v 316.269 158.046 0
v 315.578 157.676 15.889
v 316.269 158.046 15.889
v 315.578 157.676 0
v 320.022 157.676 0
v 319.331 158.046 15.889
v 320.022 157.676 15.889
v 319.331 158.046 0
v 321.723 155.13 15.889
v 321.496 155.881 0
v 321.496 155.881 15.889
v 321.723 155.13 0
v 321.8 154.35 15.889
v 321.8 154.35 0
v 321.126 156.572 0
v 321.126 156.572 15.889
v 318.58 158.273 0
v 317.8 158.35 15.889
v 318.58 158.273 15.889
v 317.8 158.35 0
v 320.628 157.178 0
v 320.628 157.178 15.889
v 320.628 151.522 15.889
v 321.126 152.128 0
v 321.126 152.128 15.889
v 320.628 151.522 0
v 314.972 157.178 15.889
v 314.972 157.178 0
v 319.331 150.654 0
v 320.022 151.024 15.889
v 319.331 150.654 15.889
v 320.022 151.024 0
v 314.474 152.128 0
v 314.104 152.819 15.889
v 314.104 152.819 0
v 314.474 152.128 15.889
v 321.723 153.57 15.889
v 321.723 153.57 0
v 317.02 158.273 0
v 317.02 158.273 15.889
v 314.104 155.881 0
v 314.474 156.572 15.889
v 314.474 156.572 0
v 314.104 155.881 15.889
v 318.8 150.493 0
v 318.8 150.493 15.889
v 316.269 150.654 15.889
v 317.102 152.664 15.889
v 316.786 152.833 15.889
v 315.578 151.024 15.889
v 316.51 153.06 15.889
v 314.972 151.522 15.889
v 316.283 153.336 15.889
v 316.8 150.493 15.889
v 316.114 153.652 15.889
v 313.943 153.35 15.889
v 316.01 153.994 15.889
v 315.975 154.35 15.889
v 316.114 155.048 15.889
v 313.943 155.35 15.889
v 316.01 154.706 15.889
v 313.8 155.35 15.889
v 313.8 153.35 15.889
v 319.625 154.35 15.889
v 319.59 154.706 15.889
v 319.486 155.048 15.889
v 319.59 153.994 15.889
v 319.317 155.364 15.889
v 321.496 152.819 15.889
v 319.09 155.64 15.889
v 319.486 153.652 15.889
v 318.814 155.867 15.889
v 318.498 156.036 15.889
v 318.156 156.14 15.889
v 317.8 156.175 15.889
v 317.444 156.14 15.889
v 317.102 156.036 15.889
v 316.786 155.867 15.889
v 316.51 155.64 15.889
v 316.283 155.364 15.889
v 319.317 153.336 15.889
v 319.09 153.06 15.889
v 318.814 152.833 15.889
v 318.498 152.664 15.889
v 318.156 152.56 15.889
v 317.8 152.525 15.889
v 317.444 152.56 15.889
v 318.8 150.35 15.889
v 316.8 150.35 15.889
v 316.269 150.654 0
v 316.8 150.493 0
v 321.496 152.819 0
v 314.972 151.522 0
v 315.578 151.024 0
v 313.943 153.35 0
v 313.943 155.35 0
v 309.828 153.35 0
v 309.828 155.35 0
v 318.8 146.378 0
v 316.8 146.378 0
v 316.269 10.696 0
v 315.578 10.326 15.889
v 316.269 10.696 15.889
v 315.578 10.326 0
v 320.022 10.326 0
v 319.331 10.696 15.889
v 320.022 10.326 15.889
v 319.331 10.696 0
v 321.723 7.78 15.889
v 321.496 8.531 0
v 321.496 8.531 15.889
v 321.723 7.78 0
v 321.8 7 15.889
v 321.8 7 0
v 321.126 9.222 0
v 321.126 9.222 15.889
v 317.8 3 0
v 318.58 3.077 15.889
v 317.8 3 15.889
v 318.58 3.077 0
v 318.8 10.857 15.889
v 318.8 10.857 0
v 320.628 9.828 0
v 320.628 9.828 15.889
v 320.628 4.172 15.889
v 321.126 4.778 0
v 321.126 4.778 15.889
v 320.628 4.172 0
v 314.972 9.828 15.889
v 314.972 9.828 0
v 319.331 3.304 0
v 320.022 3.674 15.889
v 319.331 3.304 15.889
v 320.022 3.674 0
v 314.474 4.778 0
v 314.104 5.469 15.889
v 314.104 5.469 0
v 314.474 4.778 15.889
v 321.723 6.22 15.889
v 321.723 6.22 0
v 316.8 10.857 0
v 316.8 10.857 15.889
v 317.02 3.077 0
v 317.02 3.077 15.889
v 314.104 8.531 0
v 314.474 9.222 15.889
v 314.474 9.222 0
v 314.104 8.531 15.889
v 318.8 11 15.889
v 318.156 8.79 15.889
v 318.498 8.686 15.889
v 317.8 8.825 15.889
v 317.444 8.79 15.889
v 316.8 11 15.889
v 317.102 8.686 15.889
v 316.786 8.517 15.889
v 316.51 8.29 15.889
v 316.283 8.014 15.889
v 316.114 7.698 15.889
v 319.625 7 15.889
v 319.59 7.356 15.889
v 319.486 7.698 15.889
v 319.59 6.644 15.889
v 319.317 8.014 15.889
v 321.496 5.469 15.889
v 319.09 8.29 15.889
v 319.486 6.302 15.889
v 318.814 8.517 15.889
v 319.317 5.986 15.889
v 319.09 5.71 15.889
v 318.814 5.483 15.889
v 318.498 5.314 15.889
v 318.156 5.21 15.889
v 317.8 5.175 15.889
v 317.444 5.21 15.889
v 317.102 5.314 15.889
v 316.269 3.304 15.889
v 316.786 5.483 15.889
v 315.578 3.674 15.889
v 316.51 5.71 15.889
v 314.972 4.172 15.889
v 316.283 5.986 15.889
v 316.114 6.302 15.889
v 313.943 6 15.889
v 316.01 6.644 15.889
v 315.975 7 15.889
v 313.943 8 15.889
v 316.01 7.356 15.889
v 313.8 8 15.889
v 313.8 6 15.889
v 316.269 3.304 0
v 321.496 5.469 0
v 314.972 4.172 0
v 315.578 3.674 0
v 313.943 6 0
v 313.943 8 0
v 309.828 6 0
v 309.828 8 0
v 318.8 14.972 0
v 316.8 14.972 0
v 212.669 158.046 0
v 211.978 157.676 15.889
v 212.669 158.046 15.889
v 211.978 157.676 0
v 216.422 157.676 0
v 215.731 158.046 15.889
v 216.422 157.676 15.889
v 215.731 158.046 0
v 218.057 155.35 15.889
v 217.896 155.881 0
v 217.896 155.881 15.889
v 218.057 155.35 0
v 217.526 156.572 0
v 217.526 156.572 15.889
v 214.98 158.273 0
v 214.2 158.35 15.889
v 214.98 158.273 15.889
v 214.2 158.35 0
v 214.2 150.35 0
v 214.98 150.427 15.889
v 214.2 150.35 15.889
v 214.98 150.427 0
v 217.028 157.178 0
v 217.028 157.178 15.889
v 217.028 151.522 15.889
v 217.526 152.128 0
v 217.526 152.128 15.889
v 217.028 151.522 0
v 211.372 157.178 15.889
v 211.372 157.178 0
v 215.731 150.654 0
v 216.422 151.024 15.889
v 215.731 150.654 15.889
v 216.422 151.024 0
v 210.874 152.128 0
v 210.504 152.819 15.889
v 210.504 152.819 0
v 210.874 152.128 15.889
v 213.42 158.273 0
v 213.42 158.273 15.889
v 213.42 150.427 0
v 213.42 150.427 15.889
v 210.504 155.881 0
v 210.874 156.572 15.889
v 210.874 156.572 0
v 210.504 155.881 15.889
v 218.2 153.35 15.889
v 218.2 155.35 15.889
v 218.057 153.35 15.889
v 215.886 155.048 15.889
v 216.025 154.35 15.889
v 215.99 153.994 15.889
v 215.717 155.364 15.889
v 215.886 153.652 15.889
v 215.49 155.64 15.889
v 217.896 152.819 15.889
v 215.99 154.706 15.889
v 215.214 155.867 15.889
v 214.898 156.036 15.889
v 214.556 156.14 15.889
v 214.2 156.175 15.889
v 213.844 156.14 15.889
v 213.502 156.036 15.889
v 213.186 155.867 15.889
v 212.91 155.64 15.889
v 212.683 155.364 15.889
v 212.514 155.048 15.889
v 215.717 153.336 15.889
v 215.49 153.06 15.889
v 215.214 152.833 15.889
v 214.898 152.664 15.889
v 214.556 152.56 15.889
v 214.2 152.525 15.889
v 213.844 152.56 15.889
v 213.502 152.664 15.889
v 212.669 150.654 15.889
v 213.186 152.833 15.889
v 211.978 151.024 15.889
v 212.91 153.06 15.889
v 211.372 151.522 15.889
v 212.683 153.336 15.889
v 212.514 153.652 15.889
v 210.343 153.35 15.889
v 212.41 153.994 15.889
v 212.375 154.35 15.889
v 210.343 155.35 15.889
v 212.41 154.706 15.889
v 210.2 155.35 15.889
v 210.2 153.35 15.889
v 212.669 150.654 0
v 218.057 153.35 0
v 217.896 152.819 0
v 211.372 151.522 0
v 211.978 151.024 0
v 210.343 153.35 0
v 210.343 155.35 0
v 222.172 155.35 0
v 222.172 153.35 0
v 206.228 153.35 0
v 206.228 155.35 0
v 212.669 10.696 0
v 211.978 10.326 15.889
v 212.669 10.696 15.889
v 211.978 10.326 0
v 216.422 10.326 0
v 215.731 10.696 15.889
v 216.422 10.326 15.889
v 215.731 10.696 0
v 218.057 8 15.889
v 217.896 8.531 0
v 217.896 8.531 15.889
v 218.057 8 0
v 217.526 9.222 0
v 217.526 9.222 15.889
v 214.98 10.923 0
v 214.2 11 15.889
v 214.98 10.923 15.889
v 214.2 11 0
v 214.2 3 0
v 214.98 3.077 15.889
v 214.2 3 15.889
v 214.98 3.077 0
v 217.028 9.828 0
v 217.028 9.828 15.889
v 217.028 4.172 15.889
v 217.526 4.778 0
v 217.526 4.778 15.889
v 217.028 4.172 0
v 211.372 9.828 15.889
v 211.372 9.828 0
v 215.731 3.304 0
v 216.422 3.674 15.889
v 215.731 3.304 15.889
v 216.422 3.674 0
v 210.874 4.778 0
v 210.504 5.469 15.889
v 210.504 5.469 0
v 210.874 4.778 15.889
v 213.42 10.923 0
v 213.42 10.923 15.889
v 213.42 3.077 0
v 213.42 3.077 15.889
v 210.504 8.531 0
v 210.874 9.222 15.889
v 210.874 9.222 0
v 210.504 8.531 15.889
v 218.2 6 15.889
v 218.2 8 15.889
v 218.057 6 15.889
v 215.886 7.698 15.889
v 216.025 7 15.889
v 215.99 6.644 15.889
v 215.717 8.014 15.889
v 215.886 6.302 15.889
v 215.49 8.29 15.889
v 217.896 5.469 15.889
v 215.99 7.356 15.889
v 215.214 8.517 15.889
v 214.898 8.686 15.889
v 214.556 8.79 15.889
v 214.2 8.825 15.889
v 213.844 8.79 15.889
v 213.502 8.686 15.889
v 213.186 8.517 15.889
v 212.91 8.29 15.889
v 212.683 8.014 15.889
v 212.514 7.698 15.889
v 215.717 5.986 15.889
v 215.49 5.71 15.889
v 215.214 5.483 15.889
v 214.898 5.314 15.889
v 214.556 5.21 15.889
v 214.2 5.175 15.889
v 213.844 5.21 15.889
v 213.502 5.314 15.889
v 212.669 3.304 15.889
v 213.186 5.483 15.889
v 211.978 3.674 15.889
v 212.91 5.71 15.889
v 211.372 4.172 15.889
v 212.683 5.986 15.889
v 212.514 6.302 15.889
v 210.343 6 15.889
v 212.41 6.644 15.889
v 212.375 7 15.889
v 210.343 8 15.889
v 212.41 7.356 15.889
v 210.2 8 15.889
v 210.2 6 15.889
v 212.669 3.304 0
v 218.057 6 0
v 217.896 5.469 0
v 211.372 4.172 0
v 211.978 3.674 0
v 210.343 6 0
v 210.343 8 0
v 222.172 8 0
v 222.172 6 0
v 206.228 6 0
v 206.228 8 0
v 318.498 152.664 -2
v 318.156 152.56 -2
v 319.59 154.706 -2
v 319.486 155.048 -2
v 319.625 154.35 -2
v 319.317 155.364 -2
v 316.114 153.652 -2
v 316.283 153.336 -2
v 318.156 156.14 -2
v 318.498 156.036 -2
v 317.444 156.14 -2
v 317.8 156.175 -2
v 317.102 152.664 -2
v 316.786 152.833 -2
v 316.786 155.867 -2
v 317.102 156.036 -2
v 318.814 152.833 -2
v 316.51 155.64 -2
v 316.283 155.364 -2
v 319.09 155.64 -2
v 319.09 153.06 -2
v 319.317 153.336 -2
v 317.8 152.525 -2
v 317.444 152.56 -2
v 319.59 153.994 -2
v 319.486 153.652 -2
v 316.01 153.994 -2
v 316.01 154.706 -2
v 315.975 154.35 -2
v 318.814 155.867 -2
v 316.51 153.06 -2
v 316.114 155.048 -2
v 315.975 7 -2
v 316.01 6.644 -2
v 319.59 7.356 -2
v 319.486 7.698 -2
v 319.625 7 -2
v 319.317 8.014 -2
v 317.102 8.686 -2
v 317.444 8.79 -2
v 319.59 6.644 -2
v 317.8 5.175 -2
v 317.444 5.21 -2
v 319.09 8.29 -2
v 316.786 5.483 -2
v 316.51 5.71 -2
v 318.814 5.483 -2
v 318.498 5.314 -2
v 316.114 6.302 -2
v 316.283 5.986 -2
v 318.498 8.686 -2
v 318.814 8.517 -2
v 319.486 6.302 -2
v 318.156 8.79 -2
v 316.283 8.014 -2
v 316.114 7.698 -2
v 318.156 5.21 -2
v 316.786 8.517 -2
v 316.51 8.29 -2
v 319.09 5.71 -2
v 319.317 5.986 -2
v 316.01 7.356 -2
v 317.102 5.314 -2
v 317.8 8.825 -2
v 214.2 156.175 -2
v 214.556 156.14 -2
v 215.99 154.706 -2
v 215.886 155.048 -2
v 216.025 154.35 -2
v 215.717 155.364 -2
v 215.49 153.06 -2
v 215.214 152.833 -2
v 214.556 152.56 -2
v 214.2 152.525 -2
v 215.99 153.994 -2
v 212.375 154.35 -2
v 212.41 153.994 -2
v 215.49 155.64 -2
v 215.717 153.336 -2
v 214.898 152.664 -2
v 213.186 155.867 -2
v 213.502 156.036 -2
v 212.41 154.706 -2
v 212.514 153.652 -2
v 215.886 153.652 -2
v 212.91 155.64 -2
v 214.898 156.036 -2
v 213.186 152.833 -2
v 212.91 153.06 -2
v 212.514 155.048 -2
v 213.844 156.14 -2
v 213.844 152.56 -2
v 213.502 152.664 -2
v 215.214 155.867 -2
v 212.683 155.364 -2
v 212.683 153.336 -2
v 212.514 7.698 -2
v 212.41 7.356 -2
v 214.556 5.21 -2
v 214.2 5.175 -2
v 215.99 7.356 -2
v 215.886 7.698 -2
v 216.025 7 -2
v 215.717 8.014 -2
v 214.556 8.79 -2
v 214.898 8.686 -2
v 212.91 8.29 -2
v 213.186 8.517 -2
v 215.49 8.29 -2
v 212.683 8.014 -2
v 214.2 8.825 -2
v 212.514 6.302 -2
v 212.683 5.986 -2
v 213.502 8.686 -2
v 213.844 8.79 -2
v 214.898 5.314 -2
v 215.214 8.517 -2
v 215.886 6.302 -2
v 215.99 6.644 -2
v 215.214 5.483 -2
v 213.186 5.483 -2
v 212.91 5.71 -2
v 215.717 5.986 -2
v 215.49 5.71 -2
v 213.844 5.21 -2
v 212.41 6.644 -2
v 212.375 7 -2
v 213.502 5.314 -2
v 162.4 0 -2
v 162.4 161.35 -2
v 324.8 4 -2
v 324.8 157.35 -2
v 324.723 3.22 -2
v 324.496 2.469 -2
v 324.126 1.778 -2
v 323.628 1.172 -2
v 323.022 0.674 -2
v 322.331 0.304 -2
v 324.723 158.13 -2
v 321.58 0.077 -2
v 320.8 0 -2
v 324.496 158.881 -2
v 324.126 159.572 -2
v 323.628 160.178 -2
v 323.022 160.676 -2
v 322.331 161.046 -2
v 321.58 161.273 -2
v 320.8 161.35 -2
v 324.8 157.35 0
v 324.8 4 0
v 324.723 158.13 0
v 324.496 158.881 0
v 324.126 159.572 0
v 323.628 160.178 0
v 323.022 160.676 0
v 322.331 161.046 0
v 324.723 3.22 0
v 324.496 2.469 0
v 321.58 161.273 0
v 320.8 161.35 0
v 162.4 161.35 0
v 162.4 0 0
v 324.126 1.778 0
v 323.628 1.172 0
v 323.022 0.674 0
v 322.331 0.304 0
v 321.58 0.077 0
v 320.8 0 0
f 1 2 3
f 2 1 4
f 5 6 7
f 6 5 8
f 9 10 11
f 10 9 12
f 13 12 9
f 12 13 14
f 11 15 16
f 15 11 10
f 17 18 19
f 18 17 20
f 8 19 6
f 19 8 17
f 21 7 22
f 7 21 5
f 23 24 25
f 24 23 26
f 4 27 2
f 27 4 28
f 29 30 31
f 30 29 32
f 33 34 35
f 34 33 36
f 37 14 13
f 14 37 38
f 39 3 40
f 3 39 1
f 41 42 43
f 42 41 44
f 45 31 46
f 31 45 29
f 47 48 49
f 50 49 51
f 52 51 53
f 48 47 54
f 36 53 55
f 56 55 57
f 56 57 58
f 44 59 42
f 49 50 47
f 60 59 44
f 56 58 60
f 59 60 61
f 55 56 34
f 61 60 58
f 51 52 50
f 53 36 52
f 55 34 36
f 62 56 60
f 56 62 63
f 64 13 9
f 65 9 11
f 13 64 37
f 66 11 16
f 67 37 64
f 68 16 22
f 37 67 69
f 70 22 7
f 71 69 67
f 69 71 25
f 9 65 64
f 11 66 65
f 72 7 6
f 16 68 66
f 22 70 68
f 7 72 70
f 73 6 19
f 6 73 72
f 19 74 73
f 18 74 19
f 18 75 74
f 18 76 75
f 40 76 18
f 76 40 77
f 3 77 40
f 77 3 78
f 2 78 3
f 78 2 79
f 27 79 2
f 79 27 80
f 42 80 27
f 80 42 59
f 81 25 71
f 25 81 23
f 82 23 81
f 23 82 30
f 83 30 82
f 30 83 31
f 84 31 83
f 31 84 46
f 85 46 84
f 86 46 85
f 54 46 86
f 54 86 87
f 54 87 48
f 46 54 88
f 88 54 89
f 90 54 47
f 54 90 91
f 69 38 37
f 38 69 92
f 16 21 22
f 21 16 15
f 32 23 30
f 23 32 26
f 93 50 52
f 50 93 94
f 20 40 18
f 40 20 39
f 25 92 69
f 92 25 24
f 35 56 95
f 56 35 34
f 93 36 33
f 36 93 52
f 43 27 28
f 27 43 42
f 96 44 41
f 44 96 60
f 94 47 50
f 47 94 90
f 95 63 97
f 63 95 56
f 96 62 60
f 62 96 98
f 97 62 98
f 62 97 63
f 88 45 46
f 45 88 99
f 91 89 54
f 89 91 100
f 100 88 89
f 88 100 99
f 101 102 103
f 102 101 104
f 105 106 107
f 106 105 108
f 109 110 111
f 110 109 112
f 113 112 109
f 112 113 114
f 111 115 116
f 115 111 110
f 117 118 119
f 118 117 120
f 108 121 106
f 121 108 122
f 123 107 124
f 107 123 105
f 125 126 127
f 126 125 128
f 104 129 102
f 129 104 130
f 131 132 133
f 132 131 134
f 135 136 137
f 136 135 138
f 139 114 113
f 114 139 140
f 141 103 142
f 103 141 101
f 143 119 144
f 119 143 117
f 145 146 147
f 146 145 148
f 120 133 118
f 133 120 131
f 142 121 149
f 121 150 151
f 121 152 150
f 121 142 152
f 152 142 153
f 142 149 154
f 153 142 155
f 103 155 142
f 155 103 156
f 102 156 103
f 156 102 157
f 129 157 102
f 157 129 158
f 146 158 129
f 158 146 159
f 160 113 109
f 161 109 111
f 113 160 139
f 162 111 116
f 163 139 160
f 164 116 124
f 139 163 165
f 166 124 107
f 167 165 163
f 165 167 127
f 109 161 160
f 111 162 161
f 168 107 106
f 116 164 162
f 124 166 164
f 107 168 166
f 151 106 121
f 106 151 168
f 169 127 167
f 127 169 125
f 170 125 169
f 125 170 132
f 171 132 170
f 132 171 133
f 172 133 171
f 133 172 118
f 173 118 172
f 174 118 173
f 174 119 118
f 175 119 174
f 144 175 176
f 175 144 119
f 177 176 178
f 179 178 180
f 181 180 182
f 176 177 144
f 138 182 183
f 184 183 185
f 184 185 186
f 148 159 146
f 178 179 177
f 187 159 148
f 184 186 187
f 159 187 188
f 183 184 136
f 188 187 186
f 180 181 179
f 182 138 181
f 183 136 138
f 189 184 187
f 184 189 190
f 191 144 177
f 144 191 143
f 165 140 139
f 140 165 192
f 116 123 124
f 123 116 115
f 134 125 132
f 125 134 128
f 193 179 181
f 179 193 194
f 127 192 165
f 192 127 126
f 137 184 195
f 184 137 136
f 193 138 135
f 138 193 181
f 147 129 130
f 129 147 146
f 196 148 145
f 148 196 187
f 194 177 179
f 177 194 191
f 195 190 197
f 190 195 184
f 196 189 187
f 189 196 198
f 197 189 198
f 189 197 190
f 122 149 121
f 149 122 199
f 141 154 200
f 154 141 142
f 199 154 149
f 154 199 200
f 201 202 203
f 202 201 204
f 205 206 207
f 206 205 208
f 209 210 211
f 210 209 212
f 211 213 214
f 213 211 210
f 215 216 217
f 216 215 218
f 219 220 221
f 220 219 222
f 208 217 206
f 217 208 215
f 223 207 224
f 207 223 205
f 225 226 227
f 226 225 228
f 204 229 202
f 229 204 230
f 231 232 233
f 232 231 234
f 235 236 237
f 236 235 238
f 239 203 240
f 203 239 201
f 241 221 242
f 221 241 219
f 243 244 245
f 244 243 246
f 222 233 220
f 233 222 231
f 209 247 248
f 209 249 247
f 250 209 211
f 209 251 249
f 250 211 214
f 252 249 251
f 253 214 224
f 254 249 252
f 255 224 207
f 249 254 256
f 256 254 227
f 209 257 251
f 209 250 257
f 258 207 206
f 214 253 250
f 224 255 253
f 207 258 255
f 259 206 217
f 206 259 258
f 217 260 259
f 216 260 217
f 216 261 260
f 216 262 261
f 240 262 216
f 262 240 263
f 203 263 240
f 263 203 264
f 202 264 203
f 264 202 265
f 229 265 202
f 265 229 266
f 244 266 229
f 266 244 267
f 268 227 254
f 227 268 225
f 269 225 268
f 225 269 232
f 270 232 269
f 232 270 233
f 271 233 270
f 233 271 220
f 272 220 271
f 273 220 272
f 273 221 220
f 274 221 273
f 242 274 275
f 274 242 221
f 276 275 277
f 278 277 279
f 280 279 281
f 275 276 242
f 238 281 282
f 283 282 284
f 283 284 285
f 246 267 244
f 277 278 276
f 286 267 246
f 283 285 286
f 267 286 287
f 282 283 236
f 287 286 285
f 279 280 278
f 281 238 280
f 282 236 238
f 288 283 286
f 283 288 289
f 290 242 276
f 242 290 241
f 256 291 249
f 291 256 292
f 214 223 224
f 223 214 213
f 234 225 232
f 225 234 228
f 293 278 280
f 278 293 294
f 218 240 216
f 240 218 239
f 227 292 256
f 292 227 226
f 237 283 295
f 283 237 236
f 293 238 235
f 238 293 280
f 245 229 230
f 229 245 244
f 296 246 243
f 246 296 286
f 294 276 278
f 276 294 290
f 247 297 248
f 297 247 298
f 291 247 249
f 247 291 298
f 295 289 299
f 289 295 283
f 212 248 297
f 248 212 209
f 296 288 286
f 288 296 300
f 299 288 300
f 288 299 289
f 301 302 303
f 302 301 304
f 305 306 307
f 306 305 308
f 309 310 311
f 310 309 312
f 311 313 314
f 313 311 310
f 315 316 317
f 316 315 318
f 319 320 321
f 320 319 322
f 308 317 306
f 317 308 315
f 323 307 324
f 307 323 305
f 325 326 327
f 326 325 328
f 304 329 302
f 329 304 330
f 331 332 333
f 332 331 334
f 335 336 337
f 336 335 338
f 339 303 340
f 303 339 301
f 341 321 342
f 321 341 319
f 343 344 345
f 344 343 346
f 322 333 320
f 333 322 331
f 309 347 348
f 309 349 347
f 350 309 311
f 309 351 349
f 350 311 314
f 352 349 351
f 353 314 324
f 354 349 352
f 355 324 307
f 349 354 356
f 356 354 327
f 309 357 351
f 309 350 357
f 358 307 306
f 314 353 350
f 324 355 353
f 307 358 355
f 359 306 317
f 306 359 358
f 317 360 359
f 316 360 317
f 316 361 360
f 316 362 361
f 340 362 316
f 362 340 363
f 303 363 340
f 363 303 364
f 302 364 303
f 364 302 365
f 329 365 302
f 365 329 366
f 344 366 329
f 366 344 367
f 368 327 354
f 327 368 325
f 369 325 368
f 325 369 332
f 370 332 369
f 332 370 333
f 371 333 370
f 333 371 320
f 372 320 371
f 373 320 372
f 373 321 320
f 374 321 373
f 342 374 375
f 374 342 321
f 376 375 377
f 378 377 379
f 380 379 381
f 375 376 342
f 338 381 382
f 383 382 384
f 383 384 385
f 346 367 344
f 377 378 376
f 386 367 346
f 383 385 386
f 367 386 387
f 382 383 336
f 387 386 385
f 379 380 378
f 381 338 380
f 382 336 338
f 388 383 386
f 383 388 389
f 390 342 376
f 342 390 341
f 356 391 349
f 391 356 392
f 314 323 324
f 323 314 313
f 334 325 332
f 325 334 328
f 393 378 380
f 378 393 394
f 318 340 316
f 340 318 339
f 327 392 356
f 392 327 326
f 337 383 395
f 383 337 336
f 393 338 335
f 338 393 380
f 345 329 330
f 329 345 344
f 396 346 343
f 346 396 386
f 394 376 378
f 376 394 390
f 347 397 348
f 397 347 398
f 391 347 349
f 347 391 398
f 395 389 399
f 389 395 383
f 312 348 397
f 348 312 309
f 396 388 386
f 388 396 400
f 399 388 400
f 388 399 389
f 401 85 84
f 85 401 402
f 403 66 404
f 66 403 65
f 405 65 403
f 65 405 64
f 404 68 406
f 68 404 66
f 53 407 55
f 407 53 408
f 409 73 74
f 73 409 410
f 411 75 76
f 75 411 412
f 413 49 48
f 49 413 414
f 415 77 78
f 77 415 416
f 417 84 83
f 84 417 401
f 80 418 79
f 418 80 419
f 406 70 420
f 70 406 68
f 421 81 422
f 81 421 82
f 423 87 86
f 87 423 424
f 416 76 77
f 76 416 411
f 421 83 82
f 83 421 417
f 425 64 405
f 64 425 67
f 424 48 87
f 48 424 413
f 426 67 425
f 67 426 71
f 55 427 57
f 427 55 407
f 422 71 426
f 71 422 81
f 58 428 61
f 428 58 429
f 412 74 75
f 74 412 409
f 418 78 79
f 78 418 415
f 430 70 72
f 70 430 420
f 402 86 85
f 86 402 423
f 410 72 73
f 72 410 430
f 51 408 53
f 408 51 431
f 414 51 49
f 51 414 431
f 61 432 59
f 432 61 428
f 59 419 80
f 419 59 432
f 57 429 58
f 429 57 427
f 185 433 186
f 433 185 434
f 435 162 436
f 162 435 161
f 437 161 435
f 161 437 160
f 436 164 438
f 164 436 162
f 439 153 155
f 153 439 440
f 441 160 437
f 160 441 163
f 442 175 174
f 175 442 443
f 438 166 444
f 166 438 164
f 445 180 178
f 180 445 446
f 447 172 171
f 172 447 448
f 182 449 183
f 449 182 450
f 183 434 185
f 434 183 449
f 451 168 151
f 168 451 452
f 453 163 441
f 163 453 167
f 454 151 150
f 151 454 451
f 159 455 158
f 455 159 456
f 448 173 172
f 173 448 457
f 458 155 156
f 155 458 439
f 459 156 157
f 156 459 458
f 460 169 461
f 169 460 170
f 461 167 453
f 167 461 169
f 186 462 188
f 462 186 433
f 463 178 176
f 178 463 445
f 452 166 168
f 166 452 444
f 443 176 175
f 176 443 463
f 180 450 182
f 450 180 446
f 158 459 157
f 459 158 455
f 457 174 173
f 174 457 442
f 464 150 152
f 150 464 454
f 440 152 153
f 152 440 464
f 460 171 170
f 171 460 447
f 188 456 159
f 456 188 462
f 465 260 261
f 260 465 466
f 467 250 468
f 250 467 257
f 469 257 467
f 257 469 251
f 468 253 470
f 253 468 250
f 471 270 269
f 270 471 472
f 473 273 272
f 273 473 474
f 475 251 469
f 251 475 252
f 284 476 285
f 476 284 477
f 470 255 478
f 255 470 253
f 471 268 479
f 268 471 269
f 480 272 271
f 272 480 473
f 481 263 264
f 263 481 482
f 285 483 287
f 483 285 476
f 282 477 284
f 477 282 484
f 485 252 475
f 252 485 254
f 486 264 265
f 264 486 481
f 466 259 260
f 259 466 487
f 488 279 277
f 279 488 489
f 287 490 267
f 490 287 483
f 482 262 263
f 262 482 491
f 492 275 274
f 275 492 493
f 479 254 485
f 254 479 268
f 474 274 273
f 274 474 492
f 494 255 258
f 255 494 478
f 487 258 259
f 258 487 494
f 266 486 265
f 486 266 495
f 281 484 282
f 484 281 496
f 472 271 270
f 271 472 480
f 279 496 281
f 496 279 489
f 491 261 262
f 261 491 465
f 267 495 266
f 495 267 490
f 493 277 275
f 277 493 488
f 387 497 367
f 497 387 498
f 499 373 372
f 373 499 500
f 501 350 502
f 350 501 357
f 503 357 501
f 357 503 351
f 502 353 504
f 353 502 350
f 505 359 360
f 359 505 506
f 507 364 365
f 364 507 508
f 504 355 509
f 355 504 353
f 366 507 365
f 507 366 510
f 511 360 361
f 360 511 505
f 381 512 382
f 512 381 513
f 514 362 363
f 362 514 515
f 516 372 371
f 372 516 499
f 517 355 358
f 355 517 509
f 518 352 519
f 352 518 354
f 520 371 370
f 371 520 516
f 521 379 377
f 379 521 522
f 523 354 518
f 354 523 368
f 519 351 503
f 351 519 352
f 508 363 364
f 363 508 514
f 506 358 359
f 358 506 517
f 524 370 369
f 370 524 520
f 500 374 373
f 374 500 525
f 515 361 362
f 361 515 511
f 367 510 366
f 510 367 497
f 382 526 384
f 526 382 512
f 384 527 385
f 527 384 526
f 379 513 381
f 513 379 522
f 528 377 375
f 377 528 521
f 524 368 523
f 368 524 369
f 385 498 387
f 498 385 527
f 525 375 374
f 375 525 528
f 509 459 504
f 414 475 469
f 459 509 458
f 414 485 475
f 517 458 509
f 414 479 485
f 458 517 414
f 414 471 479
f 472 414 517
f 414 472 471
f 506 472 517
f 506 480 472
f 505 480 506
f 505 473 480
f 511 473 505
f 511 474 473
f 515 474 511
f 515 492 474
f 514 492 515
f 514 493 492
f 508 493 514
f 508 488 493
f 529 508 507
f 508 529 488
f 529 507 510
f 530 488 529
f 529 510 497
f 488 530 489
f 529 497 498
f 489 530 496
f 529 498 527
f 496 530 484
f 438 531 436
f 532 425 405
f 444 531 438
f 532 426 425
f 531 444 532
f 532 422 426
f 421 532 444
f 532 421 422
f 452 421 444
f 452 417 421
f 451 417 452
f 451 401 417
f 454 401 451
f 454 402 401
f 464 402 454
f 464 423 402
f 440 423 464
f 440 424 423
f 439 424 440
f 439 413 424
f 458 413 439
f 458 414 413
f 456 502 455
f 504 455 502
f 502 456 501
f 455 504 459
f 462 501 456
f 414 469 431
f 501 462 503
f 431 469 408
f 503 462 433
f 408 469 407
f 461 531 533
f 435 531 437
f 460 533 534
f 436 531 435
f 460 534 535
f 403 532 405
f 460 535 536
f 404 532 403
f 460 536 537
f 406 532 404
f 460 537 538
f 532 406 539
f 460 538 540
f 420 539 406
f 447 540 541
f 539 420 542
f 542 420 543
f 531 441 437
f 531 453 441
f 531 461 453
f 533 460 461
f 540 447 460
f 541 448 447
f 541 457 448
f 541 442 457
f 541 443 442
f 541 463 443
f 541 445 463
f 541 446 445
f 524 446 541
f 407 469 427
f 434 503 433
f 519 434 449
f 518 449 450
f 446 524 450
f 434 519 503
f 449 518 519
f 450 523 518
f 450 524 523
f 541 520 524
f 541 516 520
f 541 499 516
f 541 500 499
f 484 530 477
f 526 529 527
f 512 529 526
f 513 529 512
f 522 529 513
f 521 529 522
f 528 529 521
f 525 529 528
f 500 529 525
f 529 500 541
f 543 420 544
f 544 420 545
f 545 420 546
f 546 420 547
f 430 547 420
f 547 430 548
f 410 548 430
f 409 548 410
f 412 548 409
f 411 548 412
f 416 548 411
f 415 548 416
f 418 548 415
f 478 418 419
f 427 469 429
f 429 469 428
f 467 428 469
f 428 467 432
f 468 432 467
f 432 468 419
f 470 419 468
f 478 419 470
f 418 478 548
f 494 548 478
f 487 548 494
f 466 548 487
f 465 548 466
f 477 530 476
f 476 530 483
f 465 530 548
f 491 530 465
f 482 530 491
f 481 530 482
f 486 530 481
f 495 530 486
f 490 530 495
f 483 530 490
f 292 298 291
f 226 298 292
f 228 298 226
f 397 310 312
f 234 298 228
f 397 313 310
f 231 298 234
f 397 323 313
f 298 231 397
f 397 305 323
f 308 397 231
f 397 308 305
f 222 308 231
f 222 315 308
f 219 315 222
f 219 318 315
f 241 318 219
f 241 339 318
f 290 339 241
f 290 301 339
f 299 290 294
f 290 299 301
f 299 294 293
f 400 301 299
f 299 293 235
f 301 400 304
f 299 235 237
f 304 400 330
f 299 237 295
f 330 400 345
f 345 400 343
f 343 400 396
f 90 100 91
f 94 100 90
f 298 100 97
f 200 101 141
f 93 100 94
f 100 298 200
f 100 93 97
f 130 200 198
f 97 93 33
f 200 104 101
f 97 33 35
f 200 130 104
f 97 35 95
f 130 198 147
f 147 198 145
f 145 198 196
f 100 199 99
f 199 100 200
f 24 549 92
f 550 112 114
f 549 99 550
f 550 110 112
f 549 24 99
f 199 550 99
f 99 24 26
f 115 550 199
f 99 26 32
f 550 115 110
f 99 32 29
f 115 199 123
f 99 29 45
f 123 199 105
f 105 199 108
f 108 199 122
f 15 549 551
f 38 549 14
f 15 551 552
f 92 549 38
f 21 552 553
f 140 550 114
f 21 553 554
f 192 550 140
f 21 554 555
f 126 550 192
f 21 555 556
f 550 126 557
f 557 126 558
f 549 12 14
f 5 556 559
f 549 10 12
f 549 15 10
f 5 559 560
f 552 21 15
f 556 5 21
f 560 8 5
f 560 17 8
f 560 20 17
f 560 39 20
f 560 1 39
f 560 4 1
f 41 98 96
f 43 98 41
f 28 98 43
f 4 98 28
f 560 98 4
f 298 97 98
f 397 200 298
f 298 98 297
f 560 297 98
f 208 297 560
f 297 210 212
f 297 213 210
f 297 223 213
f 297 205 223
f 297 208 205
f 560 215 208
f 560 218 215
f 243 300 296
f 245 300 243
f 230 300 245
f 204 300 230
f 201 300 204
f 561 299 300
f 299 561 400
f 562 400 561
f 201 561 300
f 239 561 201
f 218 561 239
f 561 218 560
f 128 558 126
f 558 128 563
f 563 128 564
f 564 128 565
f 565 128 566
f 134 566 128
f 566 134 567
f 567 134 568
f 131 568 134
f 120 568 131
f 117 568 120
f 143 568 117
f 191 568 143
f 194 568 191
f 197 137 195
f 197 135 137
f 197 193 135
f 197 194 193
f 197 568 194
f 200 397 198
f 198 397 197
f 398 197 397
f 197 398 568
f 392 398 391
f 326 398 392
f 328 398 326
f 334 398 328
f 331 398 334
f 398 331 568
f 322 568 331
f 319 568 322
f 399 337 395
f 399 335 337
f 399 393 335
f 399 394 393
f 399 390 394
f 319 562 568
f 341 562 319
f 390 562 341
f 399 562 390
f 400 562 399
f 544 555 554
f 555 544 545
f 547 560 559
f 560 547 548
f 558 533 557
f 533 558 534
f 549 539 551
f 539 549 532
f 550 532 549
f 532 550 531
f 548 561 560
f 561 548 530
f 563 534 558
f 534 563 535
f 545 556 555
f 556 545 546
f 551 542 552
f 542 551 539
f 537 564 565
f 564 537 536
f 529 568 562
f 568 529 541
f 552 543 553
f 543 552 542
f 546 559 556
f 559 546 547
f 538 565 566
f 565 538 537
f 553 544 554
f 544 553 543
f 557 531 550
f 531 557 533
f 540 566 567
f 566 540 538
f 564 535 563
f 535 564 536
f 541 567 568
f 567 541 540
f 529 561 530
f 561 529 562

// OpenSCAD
// Generated by SolidPython 1.1.3 on 2024-04-18 16:18:07
$fn = 32;


difference() {
	intersection() {
		union() {
			difference() {
				translate(v = [0, 0, 16.4445000000]) {
					translate(v = [0, 147.3500000000, 0]) {
						translate(v = [10, 0, 0]) {
							difference() {
								translate(v = [-3, 0, 0]) {
									translate(v = [0, -140.3500000000, 0]) {
										translate(v = [0, 0, -69.5555000000]) {
											union() {
												translate(v = [0, 0, 0]) {
													translate(v = [0, 0, 0]) {
														union() {
															cylinder(h = 69, r = 4.0000000000);
															rotate(a = 90, v = [1, 0, 0]) {
																linear_extrude(center = true, height = 2) {
																	polygon(paths = [[0, 1, 2, 3]], points = [[0, 0], [0, 69], [4.0000000000, 69], [21.2500000000, 0]]);
																}
															}
															rotate(a = 90, v = [0, 0, 1]) {
																rotate(a = 90, v = [1, 0, 0]) {
																	linear_extrude(center = true, height = 2) {
																		polygon(paths = [[0, 1, 2, 3]], points = [[0, 0], [0, 69], [4.0000000000, 69], [21.2500000000, 0]]);
																	}
																}
															}
														}
													}
												}
												translate(v = [0, 0, 0]) {
													translate(v = [0, 147.3500000000, 0]) {
														union() {
															cylinder(h = 69, r = 4.0000000000);
															rotate(a = 90, v = [1, 0, 0]) {
																linear_extrude(center = true, height = 2) {
																	polygon(paths = [[0, 1, 2, 3]], points = [[0, 0], [0, 69], [4.0000000000, 69], [21.2500000000, 0]]);
																}
															}
															rotate(a = 270, v = [0, 0, 1]) {
																rotate(a = 90, v = [1, 0, 0]) {
																	linear_extrude(center = true, height = 2) {
																		polygon(paths = [[0, 1, 2, 3]], points = [[0, 0], [0, 69], [4.0000000000, 69], [21.2500000000, 0]]);
																	}
																}
															}
														}
													}
												}
												translate(v = [310.8000000000, 0, 0]) {
													translate(v = [0, 147.3500000000, 0]) {
														union() {
															cylinder(h = 69, r = 4.0000000000);
															rotate(a = 180, v = [0, 0, 1]) {
																rotate(a = 90, v = [1, 0, 0]) {
																	linear_extrude(center = true, height = 2) {
																		polygon(paths = [[0, 1, 2, 3]], points = [[0, 0], [0, 69], [4.0000000000, 69], [21.2500000000, 0]]);
																	}
																}
															}
															rotate(a = 270, v = [0, 0, 1]) {
																rotate(a = 90, v = [1, 0, 0]) {
																	linear_extrude(center = true, height = 2) {
																		polygon(paths = [[0, 1, 2, 3]], points = [[0, 0], [0, 69], [4.0000000000, 69], [21.2500000000, 0]]);
																	}
																}
															}
														}
													}
												}
												translate(v = [310.8000000000, 0, 0]) {
													translate(v = [0, 0, 0]) {
														union() {
															cylinder(h = 69, r = 4.0000000000);
															rotate(a = 180, v = [0, 0, 1]) {
																rotate(a = 90, v = [1, 0, 0]) {
																	linear_extrude(center = true, height = 2) {
																		polygon(paths = [[0, 1, 2, 3]], points = [[0, 0], [0, 69], [4.0000000000, 69], [21.2500000000, 0]]);
																	}
																}
															}
															rotate(a = 90, v = [0, 0, 1]) {
																rotate(a = 90, v = [1, 0, 0]) {
																	linear_extrude(center = true, height = 2) {
																		polygon(paths = [[0, 1, 2, 3]], points = [[0, 0], [0, 69], [4.0000000000, 69], [21.2500000000, 0]]);
																	}
																}
															}
														}
													}
												}
												translate(v = [103.6000000000, 0, 0]) {
													translate(v = [0, 147.3500000000, 0]) {
														union() {
															cylinder(h = 69, r = 4.0000000000);
															rotate(a = 90, v = [1, 0, 0]) {
																linear_extrude(center = true, height = 2) {
																	polygon(paths = [[0, 1, 2, 3]], points = [[0, 0], [0, 69], [4.0000000000, 69], [21.2500000000, 0]]);
																}
															}
															rotate(a = 180, v = [0, 0, 1]) {
																rotate(a = 90, v = [1, 0, 0]) {
																	linear_extrude(center = true, height = 2) {
																		polygon(paths = [[0, 1, 2, 3]], points = [[0, 0], [0, 69], [4.0000000000, 69], [21.2500000000, 0]]);
																	}
																}
															}
														}
													}
												}
												translate(v = [103.6000000000, 0, 0]) {
													translate(v = [0, 0, 0]) {
														union() {
															cylinder(h = 69, r = 4.0000000000);
															rotate(a = 90, v = [1, 0, 0]) {
																linear_extrude(center = true, height = 2) {
																	polygon(paths = [[0, 1, 2, 3]], points = [[0, 0], [0, 69], [4.0000000000, 69], [21.2500000000, 0]]);
																}
															}
															rotate(a = 180, v = [0, 0, 1]) {
																rotate(a = 90, v = [1, 0, 0]) {
																	linear_extrude(center = true, height = 2) {
																		polygon(paths = [[0, 1, 2, 3]], points = [[0, 0], [0, 69], [4.0000000000, 69], [21.2500000000, 0]]);
																	}
																}
															}
														}
													}
												}
												translate(v = [207.2000000000, 0, 0]) {
													translate(v = [0, 147.3500000000, 0]) {
														union() {
															cylinder(h = 69, r = 4.0000000000);
															rotate(a = 90, v = [1, 0, 0]) {
																linear_extrude(center = true, height = 2) {
																	polygon(paths = [[0, 1, 2, 3]], points = [[0, 0], [0, 69], [4.0000000000, 69], [21.2500000000, 0]]);
																}
															}
															rotate(a = 180, v = [0, 0, 1]) {
																rotate(a = 90, v = [1, 0, 0]) {
																	linear_extrude(center = true, height = 2) {
																		polygon(paths = [[0, 1, 2, 3]], points = [[0, 0], [0, 69], [4.0000000000, 69], [21.2500000000, 0]]);
																	}
																}
															}
														}
													}
												}
												translate(v = [207.2000000000, 0, 0]) {
													translate(v = [0, 0, 0]) {
														union() {
															cylinder(h = 69, r = 4.0000000000);
															rotate(a = 90, v = [1, 0, 0]) {
																linear_extrude(center = true, height = 2) {
																	polygon(paths = [[0, 1, 2, 3]], points = [[0, 0], [0, 69], [4.0000000000, 69], [21.2500000000, 0]]);
																}
															}
															rotate(a = 180, v = [0, 0, 1]) {
																rotate(a = 90, v = [1, 0, 0]) {
																	linear_extrude(center = true, height = 2) {
																		polygon(paths = [[0, 1, 2, 3]], points = [[0, 0], [0, 69], [4.0000000000, 69], [21.2500000000, 0]]);
																	}
																}
															}
														}
													}
												}
											}
										}
									}
								}
								translate(v = [-3, 0, 0]) {
									translate(v = [0, -140.3500000000, 0]) {
										union() {
											translate(v = [0, 0, 0]) {
												translate(v = [0, 0, 0]) {
													cylinder(center = true, h = 276, r = 1.8250000000);
												}
											}
											translate(v = [0, 0, 0]) {
												translate(v = [0, 147.3500000000, 0]) {
													cylinder(center = true, h = 276, r = 1.8250000000);
												}
											}
											translate(v = [310.8000000000, 0, 0]) {
												translate(v = [0, 147.3500000000, 0]) {
													cylinder(center = true, h = 276, r = 1.8250000000);
												}
											}
											translate(v = [310.8000000000, 0, 0]) {
												translate(v = [0, 0, 0]) {
													cylinder(center = true, h = 276, r = 1.8250000000);
												}
											}
											translate(v = [103.6000000000, 0, 0]) {
												translate(v = [0, 147.3500000000, 0]) {
													cylinder(center = true, h = 276, r = 1.8250000000);
												}
											}
											translate(v = [103.6000000000, 0, 0]) {
												translate(v = [0, 0, 0]) {
													cylinder(center = true, h = 276, r = 1.8250000000);
												}
											}
											translate(v = [207.2000000000, 0, 0]) {
												translate(v = [0, 147.3500000000, 0]) {
													cylinder(center = true, h = 276, r = 1.8250000000);
												}
											}
											translate(v = [207.2000000000, 0, 0]) {
												translate(v = [0, 0, 0]) {
													cylinder(center = true, h = 276, r = 1.8250000000);
												}
											}
										}
									}
								}
							}
						}
					}
				}
				translate(v = [0, 0, -2]) {
					translate(v = [0, 0, -100]) {
						translate(v = [0, -80.6750000000, 0]) {
							translate(v = [-162.4000000000, 0, 0]) {
								cube(size = [649.6000000000, 322.7000000000, 100]);
							}
						}
					}
				}
			}
			intersection() {
				translate(v = [0, 0, -2]) {
					translate(v = [-162.4000000000, 0, 0]) {
						translate(v = [0, -80.6750000000, 0]) {
							cube(size = [649.6000000000, 322.7000000000, 2]);
						}
					}
				}
				translate(v = [0, 0, 16.4445000000]) {
					translate(v = [0, 147.3500000000, 0]) {
						translate(v = [10, 0, 0]) {
							translate(v = [0, 0, -34.5000000000]) {
								translate(v = [152.4000000000, 0, 0]) {
									translate(v = [0, -66.6750000000, 0]) {
										minkowski() {
											cube(center = true, size = [316.8000000000, 153.3500000000, 69]);
											cylinder(center = true, h = 0.5555000000, r = 4);
										}
									}
								}
							}
						}
					}
				}
			}
		}
		translate(v = [0, 0, 16.4445000000]) {
			translate(v = [0, 147.3500000000, 0]) {
				translate(v = [10, 0, 0]) {
					translate(v = [152.4000000000, 0, 0]) {
						translate(v = [0, -242.0250000000, 0]) {
							translate(v = [0, 0, -34.5000000000]) {
								cube(size = [162.4000000000, 322.7000000000, 138]);
							}
						}
					}
				}
			}
		}
	}
	translate(v = [0, 0, 16.4445000000]) {
		translate(v = [0, 147.3500000000, 0]) {
			translate(v = [10, 0, 0]) {
				translate(v = [-3, 0, 0]) {
					translate(v = [0, -140.3500000000, 0]) {
						union() {
							translate(v = [0, 0, 0]) {
								translate(v = [0, 0, 0]) {
									cylinder(center = true, h = 276, r = 1.8250000000);
								}
							}
							translate(v = [0, 0, 0]) {
								translate(v = [0, 147.3500000000, 0]) {
									cylinder(center = true, h = 276, r = 1.8250000000);
								}
							}
							translate(v = [310.8000000000, 0, 0]) {
								translate(v = [0, 147.3500000000, 0]) {
									cylinder(center = true, h = 276, r = 1.8250000000);
								}
							}
							translate(v = [310.8000000000, 0, 0]) {
								translate(v = [0, 0, 0]) {
									cylinder(center = true, h = 276, r = 1.8250000000);
								}
							}
							translate(v = [103.6000000000, 0, 0]) {
								translate(v = [0, 147.3500000000, 0]) {
									cylinder(center = true, h = 276, r = 1.8250000000);
								}
							}
							translate(v = [103.6000000000, 0, 0]) {
								translate(v = [0, 0, 0]) {
									cylinder(center = true, h = 276, r = 1.8250000000);
								}
							}
							translate(v = [207.2000000000, 0, 0]) {
								translate(v = [0, 147.3500000000, 0]) {
									cylinder(center = true, h = 276, r = 1.8250000000);
								}
							}
							translate(v = [207.2000000000, 0, 0]) {
								translate(v = [0, 0, 0]) {
									cylinder(center = true, h = 276, r = 1.8250000000);
								}
							}
						}
					}
				}
			}
		}
	}
}
/***********************************************
*********      SolidPython code:      **********
************************************************
 
#!/usr/bin/env python3

import argparse
from asyncio import subprocess
import json
# import math
import re
import logging
import os
# import os.path
import subprocess
# import time

from solid import *
from solid.utils import *

from parameters import Parameters
from keyboard import Keyboard
from cable import Cable

# Set logger level variables
console_logging_level = logging.WARN
file_logging_level = logging.DEBUG


# Get root logger and set main logger level to DEBUG
logger = logging.getLogger()
logger.setLevel(logging.DEBUG)


# Create formatters
console_formatter = logging.Formatter('%(name)s %(levelname)s: %(funcName)s: [%(lineno)d]: %(message)s')
file_formatter = logging.Formatter('%(asctime)s %(levelname)s %(name)s: %(funcName)s: [%(lineno)d]: %(message)s')

# Create console handler and set level to info
console_handler = logging.StreamHandler()
console_handler.setLevel(console_logging_level)

# Add formatter to console_handler
console_handler.setFormatter(console_formatter)

# Add console handler to logger
logger.addHandler(console_handler)

# Get file info that will be used to creat log file
script_location = Path(os.path.dirname(os.path.realpath(__file__)))
log_file_name = 'generator.log'
log_file_path = script_location / log_file_name

# Create file handler and set level to info
file_handler = logging.FileHandler(log_file_path, mode = 'w')
file_handler.setLevel(file_logging_level)

# Add formatter to file_handler
file_handler.setFormatter(file_formatter)

# Add file handler to logger
logger.addHandler(file_handler)


# Helper for parser to wnsure filename argument has to correct extension
def CheckExt(choices):
    class Act(argparse.Action):
        def __call__(self,parser,namespace,fname,option_string=None):
            ext = os.path.splitext(fname)[1][1:]
            if ext not in choices:
                option_string = '({})'.format(option_string) if option_string else ''
                parser.error("file doesn't end with one of {}{}".format(choices,option_string))
            else:
                setattr(namespace,self.dest,fname)

    return Act



def main():

    parser = argparse.ArgumentParser(description='Build custom keyboard SCAD file using keyboard layout editor format')
    parser.add_argument('-i', '--input-file', metavar = 'layout_json_file_name.json', help = 'A path to a keyboard layout editor json file', required = True, action=CheckExt({'json'}))
    # parser.add_argument('-o', '--output-folder', metavar = 'scad', help = 'A path to a folder to store the generated open scad file')
    parser.add_argument('-p', '--parameter-file', metavar = 'parameters.json', help = 'A JSON file containing paramters for the object buing made', default = None, action=CheckExt({'json'}))
    parser.add_argument('-s', '--section', metavar = 'section_num', help = 'The number of the section that should be built', type = int, default = -1)
    parser.add_argument('-a', '--all-sections', help = 'Output all the parts for all possible sections in separate files', default = False, action = 'store_true')
    parser.add_argument('-e', '--exploded', help = 'Create test file with each section shown as an exploded view', default = False, action = 'store_true')
    parser.add_argument('-f', '--fragments', metavar = 'num_fragments', help = 'The number of fragments to be used when creating curves', type = int, default = 8)
    parser.add_argument('-r', '--render', help = 'Render an STL from the generated scad file', default = False, action = 'store_true')
    parser.add_argument('--switch-type-in-filename', help = 'Add the switch type name and stabilizer type name to the filname', default = False, action = 'store_true')

    # Parse command line arguments
    args = parser.parse_args()
    logger.debug(vars(args))

    # Create Path object from input file argument
    input_file_path = Path(args.input_file)

    # Get base folder path
    base_path = input_file_path.parent

    # Get input file name onle
    file_name_only = input_file_path.name
    
    # Get layout name from file name
    layout_name = input_file_path.stem

    # Generate output scad and stl output folder paths
    output_base_folder = base_path / layout_name
    scad_folder_path = output_base_folder / 'scad'
    stl_folder_path = output_base_folder / 'stl'

    # Ensure all outpur folders exists
    if output_base_folder.is_dir() == False:
        output_base_folder.mkdir()

    if scad_folder_path.is_dir() == False:
        scad_folder_path.mkdir()

    if stl_folder_path.is_dir() == False:
        stl_folder_path.mkdir()

    logger.debug('layout_name: %s', str(layout_name))
    logger.debug('base_path: %s', str(base_path))
    logger.debug('file_name_only: %s', str(file_name_only))
    
    # define output file extensions
    scad_postfix = '.scad'
    stl_postfix  = '.stl'

    # Set fragments per circle
    FRAGMENTS = args.fragments
    logger.debug('\tFragments: %d', FRAGMENTS)

    # Pattern and Replacement strings to be used when trying to turn keyboard-layout-editor raw output into valid JSON
    json_key_pattern = '([{,])([xywha1]+):'
    json_key_replace = '\\1"\\2":'

    # Open JSON layout file
    logger.debug('Open layout file %s', input_file_path)
    try:
        # Try with utf-8 encoding specified
        f = open(input_file_path, encoding="utf-8")
    except:
        # Failed to open
        logger.info('Failed to open layout file with utf-8 encoding specified. Try opening without specifying an encoding')
        try:
            # Try opening with no encoding spcificed
            f = open(input_file_path)
        except:
            logger.error('Failed to open layout file both spefifying utf-8 andcoding and not specifying any encodeing. Exiting')
            exit(1)

    logger.debug('Read layout JSON string from file %s', input_file_path)
    try:
        keyboard_layout = f.read()
    except UnicodeDecodeError:
        logger.error('Unable to decode layout file. Please provide utf-8 encoded files')
        exit(-1)

    keyboard_layout_dict = None

    # Load keyboard layout dictionary
    logger.debug('Parse layout file JSON string')
    try:
        # Attempt to parse to provided JSON string
        keyboard_layout_dict = json.loads(keyboard_layout)
        logger.debug('Valid Json Parsed')
    except:
        # Failed to parse the JSON test.
        # This most likely means that the keybaord-layout-editor raw output was provided
        # Attempt to modify that string to make it valid JSON
        keyboard_layout = '[%s]' % (keyboard_layout)
        keyboard_layout = re.sub(json_key_pattern, json_key_replace, keyboard_layout)
        try:
            keyboard_layout_dict = json.loads(keyboard_layout)
            logger.info('Initial layout Json Invalid. Json modified and parsed')
        except:
            logger.error('Failed to parse layout json after attempt at correction.')
            raise

    logger.debug('keyboard_layout_dict: %s', str(keyboard_layout_dict))


    # Read parameter file
    parameter_dict = None
    if args.parameter_file is not None:
        # Open JSON parameter file
        logger.debug('Open parameter file %s', args.parameter_file)
        try:
            # Try with utf-8 encoding specified
            f = open(args.parameter_file, encoding="utf-8")
        except:
            # Failed to open
            logger.info('Failed to open parameter file with utf-8 encoding specified. Try opening without specifying an encoding')
            try:
                # Try opening with no encoding spcificed
                f = open(args.parameter_fil)
            except:
                logger.error('Failed to open parameter file both spefifying utf-8 andcoding and not specifying any encodeing. Exiting')
                exit(1)
        

        logger.debug('Read JSON string from parameter file %s', args.parameter_file)
        try:
             parameter_file_text = f.read()
        except UnicodeDecodeError:
            logger.error('Unable to decode parameter file. Please provide utf-8 encoded files')
            exit(-1)
       
        logger.debug('Parse parameter JSON string')
        try:
            parameter_dict = json.loads(parameter_file_text)
            logger.debug('Valid Json Parsed')
        except:
            logger.error('Failed to parse parameter JSON file.')
            raise

        logger.debug('parameter_dict: %s', str(parameter_dict))


    # Set parameters from imput file
    parameters = Parameters(parameter_dict)
    
    # Create Keyboard instance
    keyboard = Keyboard(parameters)

    # Process the keyboard layout object
    keyboard.process_keyboard_layout(keyboard_layout_dict)
    keyboard.process_custom_shapes()

    logger.debug('kerf: %f', keyboard.kerf)

    # Dictionary of SolidPython solid objects that need to be rendered to SCAD and to STL if desired
    solid_object_dict = {}

    # Create objects for each of the generated sections
    if args.all_sections == True:
        # Iterate over all sections generated and add all sections to solid_object_dict
        for section in range(keyboard.get_top_section_count()):
            # Set current section for generator
            keyboard.set_section(section)

            # Create dict for section
            solid_object_dict[section] = {}

            # Add top assembly, plate, and all assembly to section dict
            solid_object_dict[section]['top'] = keyboard.get_assembly(top = True)
            solid_object_dict[section]['all'] = keyboard.get_assembly(all = True)
            solid_object_dict[section]['plate'] = keyboard.get_assembly(plate_only = True)

            # If there is a bottom section for the current section add it to section dict
            if section < keyboard.get_bottom_section_count():
                solid_object_dict[section]['bottom'] = keyboard.get_assembly(bottom = True)
            
    # Create exploded object
    elif args.exploded == True:
        solid_object_dict[-1] = {}
        solid_object_dict[-1]['top'] = union()
        solid_object_dict[-1]['plate'] = union()
        solid_object_dict[-1]['bottom'] = union()
        for section in range(keyboard.get_top_section_count()):
            keyboard.set_section(section)
            solid_object_dict[-1]['top'] += up(5 * section) ( right(10 * section) ( keyboard.get_assembly(top = True) ) )
            solid_object_dict[-1]['plate'] += up(5 * section) ( right(10 * section) ( keyboard.get_assembly(plate_only = True) ) )
            if section < keyboard.get_bottom_section_count():
                solid_object_dict[-1]['bottom'] += up(5 * section) ( right(10 * section) ( keyboard.get_assembly(bottom = True) ) )
    

    # Create objects for a specified section
    elif args.section > -1:
        # Set desired section to create
        keyboard.set_section(args.section)

        # Create dict for section
        solid_object_dict[args.section] = {}

        # Add top assembly, plate, and all assembly to section dict
        solid_object_dict[args.section]['top'] = keyboard.get_assembly(top = True)
        solid_object_dict[args.section]['all'] = keyboard.get_assembly(all = True)
        solid_object_dict[args.section]['plate'] = keyboard.get_assembly(plate_only = True)

        # If there is a bottom section for the current section add it to section dict
        if args.section < keyboard.get_bottom_section_count():
            solid_object_dict[args.section]['bottom'] = keyboard.get_assembly(bottom = True)

    # Create an objects that are not split into sections. No other options were specified
    else:
        logger.debug('Create whole object. No other options specified')
        solid_object_dict['all'] = {}
        solid_object_dict['all']['top'] = keyboard.get_assembly(top = True)
        solid_object_dict['all']['bottom'] = keyboard.get_assembly(bottom = True)
        solid_object_dict['all']['all'] = keyboard.get_assembly(all = True)
        solid_object_dict['all']['plate'] = keyboard.get_assembly(plate_only = True)
    
    # Add global items that are not dependant on the sctions or parts of the item to build
    solid_object_dict['global'] = {}

    # Generate a strain relief piece for the cable hole
    if parameters.cable_hole == True:
        cable = Cable(parameters)
        solid_object_dict['global']['cable_holder_main'] = cable.holder_main()
        solid_object_dict['global']['cable_holder_clamp'] = cable.holder_clamp()
        solid_object_dict['global']['cable_holder_all'] = cable.holder_all()

    print(parameters)
    print('Case Height: %f, Case Width: %f\n' % (parameters.real_case_height, parameters.real_case_width))
    
    logger.info('Case Height: %f, Case Width: %f', parameters.real_case_height, parameters.real_case_width)
    logger.info('Sections In Top: %d', keyboard.get_top_section_count())
    logger.info('Sections In Bottom: %d', keyboard.get_bottom_section_count())


    ############################################################
    # Render SCAD and STL files
    ############################################################
    subprocess_dict = {}

    switch_type_for_filename = ''
    stab_type_for_filename = ''

    for section in solid_object_dict.keys():

        if args.switch_type_in_filename == True:
            switch_type_for_filename = '_' + parameters.switch_type
            stab_type_for_filename = '_' + parameters.stabilizer_type

        section_postfix = ''

        # Creating global items that have no relaton to switch type
        if isinstance(section, str) and section == 'global':
            switch_type_for_filename = ''
            stab_type_for_filename = ''
        
        # If the current object dict section is an int greater than -1 add the section number to the filename
        if isinstance(section, int) and section > -1:
            section_postfix = '_section_%d' % (section)
        
        if args.exploded == True:
            section_postfix = '_exploded'

        for part_name in solid_object_dict[section].keys():
            part_name_formatted = '_' + part_name

            scad_file_name = scad_folder_path / (layout_name + section_postfix + part_name_formatted + switch_type_for_filename + stab_type_for_filename + scad_postfix)
            stl_file_name = stl_folder_path / (layout_name + section_postfix + part_name_formatted + switch_type_for_filename + stab_type_for_filename + stl_postfix)

            if solid_object_dict[section][part_name] is not None:
                logger.info('Generate scad file with name %s', scad_file_name)
                # Generate SCAD file from assembly
                scad_render_to_file(solid_object_dict[section][part_name], scad_file_name, file_header=f'$fn = {FRAGMENTS};')
                print('Generated scad file with name', scad_file_name)
                
                # Render STL if option is chosen
                if args.render:
                    logger.debug('Render STL from SCAD')
                    logger.info('Generate stl file with name %s from %s', stl_file_name, scad_file_name)

                    openscad_command_list = ['openscad', '-o', '%s' % (stl_file_name), '%s' % (scad_file_name)]
                    subprocess_dict[stl_file_name] = subprocess.Popen(openscad_command_list)
    
    
    ################################################################
    #  Wait for render processes to complete
    ################################################################
    if args.render:
        logger.debug(subprocess_dict)
        running = True
        while running == True:
            running = False
            for stl_file_name in subprocess_dict.keys():
                p = subprocess_dict[stl_file_name]
                if p is not None:
                    # running = True
                    rcode = None
                    try:
                        rcode = p.wait(.1)
                    except subprocess.TimeoutExpired as err:
                        running = True
                    if rcode is not None:
                        logger.info('Render Complete: file: %s', stl_file_name)
                        print('Render Complete: file:', stl_file_name)
                        subprocess_dict[stl_file_name] = None
            # time.sleep(1)



    logger.info('Generation Complete')

if __name__ == "__main__":
    main()
 
 
************************************************/
